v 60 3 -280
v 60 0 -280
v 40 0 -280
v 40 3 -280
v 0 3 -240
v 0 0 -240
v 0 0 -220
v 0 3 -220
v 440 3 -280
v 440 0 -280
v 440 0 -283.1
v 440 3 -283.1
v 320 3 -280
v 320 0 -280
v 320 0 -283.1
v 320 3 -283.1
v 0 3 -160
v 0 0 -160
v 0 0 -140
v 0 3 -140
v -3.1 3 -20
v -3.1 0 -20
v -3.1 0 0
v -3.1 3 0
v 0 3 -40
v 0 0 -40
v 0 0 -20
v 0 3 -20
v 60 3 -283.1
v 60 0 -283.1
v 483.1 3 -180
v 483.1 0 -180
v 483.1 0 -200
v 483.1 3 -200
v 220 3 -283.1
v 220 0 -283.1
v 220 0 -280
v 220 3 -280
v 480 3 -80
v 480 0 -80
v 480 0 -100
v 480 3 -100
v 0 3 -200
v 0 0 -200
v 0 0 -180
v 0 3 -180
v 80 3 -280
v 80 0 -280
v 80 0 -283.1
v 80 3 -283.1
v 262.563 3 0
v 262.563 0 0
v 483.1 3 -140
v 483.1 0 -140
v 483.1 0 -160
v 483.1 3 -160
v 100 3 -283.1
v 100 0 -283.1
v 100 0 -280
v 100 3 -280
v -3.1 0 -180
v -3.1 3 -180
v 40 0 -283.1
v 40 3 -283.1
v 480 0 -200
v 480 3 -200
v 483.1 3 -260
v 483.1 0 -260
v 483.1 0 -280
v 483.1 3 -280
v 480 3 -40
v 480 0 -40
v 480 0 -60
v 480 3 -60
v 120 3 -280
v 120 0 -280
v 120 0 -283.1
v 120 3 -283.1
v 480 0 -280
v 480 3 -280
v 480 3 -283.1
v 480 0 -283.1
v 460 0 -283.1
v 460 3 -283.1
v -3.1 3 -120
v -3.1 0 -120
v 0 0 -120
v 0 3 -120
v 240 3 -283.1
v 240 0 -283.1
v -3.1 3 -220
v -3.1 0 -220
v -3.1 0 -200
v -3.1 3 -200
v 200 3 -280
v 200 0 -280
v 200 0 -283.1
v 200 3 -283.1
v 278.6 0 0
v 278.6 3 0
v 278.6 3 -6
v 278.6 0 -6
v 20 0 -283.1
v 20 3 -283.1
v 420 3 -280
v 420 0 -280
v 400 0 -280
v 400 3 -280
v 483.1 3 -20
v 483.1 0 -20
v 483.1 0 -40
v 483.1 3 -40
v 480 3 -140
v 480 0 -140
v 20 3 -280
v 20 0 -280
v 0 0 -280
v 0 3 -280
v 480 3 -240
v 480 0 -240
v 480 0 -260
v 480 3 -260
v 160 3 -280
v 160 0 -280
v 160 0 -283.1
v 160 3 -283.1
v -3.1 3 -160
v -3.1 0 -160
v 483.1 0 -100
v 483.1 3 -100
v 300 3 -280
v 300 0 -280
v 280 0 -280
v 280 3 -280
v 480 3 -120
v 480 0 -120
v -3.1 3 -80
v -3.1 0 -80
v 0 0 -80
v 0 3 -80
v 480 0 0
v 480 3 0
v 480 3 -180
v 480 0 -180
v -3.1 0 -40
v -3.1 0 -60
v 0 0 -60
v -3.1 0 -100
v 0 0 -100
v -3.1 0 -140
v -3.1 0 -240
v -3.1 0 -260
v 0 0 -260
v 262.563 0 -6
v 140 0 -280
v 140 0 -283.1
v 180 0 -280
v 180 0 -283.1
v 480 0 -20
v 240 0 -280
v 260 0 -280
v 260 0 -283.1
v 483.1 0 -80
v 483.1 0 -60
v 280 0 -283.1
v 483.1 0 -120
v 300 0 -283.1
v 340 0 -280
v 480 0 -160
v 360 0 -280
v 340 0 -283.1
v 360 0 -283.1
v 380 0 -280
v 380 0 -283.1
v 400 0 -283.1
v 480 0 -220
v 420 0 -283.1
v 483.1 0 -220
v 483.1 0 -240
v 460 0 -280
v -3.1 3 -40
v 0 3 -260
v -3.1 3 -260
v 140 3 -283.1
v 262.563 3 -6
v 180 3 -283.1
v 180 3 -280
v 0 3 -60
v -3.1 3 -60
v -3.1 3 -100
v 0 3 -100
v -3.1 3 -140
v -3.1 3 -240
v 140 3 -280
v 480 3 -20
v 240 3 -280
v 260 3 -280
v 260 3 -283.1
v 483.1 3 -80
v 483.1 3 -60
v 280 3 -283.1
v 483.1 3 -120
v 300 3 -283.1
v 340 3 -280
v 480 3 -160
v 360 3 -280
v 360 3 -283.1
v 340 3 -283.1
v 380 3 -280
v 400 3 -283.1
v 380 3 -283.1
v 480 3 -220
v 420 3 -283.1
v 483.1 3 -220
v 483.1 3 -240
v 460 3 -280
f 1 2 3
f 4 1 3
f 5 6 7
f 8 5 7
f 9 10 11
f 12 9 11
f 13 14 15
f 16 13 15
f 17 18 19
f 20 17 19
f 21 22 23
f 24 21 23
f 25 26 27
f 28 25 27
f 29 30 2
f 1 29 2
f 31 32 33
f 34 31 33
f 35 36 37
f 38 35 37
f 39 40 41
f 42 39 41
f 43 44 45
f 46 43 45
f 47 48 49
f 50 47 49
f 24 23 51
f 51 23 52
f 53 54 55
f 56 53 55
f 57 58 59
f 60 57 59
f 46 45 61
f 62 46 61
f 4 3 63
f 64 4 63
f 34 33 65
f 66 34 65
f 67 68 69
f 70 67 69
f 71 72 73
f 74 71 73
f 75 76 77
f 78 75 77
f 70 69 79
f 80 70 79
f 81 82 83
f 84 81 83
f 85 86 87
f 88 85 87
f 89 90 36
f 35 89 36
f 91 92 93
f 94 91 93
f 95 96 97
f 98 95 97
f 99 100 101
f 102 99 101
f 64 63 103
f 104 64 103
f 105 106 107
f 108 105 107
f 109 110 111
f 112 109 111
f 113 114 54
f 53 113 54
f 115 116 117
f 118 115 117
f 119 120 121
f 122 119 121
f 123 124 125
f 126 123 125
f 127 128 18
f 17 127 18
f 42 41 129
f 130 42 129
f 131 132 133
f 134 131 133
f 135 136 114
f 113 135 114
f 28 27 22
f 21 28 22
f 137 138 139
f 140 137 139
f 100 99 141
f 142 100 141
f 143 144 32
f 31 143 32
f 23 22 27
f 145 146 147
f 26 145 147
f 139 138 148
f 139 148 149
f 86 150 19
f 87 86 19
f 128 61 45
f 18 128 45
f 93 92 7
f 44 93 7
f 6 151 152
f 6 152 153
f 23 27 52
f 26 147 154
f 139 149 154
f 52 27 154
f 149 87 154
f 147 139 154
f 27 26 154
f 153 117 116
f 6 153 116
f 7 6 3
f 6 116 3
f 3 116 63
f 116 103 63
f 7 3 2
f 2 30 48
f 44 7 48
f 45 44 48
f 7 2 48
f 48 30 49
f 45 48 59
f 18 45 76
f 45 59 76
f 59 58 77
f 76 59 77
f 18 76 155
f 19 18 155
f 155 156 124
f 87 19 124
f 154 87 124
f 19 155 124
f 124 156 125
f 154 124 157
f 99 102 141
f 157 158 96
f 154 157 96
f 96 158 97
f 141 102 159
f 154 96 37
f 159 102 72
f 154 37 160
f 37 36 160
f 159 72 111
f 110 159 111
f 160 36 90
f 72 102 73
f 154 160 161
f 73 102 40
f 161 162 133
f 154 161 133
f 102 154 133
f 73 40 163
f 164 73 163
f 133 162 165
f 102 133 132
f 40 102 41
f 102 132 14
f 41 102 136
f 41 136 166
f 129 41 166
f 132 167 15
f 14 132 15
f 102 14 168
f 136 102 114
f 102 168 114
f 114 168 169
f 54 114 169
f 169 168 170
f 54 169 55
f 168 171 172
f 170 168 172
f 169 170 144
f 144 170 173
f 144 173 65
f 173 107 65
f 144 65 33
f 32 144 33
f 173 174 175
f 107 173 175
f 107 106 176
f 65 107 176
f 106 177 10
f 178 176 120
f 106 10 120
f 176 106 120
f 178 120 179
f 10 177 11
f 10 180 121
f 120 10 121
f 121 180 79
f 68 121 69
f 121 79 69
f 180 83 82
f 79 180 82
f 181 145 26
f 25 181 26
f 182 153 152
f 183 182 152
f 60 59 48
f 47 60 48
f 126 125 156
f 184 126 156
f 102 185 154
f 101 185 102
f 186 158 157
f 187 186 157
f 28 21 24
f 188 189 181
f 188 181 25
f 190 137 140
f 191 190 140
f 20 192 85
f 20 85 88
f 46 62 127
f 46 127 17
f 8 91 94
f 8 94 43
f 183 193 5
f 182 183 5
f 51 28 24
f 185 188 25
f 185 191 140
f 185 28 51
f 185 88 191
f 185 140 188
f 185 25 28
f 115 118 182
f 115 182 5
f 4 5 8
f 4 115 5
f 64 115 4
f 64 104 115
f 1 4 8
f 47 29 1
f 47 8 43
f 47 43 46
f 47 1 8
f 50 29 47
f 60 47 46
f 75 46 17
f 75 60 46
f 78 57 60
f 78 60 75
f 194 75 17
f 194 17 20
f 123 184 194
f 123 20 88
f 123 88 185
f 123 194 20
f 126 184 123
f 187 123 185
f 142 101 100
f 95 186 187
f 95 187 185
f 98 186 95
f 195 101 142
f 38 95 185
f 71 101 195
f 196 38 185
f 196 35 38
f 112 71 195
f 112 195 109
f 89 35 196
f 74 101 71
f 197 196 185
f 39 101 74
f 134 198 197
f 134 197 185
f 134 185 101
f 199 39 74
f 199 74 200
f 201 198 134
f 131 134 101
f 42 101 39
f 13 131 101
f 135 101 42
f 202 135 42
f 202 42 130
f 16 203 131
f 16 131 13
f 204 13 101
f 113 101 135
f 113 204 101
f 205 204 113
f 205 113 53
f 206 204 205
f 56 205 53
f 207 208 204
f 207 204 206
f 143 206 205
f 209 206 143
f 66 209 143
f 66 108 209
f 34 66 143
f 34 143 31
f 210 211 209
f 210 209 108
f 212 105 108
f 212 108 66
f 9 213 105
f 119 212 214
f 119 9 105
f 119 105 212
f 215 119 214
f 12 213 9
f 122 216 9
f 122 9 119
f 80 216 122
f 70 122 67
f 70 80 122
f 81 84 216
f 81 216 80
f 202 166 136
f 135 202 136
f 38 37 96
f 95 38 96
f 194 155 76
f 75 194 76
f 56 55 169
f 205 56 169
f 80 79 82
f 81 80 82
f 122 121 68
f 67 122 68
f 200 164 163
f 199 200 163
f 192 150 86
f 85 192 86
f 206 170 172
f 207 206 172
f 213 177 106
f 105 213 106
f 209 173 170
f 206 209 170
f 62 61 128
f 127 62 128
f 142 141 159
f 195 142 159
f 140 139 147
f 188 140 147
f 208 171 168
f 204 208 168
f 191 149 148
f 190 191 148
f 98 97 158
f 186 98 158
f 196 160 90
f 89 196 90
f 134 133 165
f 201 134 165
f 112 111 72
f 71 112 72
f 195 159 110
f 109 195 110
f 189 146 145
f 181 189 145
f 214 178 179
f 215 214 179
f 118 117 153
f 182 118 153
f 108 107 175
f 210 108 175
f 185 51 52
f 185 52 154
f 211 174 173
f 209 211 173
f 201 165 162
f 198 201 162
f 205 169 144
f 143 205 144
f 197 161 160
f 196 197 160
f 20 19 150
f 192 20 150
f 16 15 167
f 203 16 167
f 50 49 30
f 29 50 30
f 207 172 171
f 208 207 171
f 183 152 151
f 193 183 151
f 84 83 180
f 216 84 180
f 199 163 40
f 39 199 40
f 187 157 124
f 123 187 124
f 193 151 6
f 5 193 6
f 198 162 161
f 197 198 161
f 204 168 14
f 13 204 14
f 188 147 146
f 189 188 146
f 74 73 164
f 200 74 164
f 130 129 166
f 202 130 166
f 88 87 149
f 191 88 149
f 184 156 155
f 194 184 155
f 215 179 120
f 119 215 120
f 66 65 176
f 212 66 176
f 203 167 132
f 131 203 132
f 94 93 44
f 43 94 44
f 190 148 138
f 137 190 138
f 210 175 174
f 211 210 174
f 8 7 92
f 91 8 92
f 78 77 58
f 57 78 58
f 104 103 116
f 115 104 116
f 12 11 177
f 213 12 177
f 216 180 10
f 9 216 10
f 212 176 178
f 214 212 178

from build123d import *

# Parameters (mm, degrees)
SALIENTE_EXTRUIR1_DEPTH = 3
CROQUIS2_W              = 16.03671643
CROQUIS2_H              = 6
CORTAR_EXTRUIR1_DEPTH   = 10


with BuildPart() as part:
    # Croquis1 → Saliente-Extruir1 (new body)
    with BuildSketch(Plane(origin=(0, 0, 0), x_dir=(1, 0, 0), z_dir=(0, 1, 0))):
        Polygon((480, 280), (480, 283.1), (460, 283.1), (460, 280), (440, 280), (440, 283.1), (420, 283.1), (420, 280), (400, 280), (400, 283.1), (380, 283.1), (380, 280), (360, 280), (360, 283.1), (340, 283.1), (340, 280), (320, 280), (320, 283.1), (300, 283.1), (300, 280), (280, 280), (280, 283.1), (260, 283.1), (260, 280), (240, 280), (240, 283.1), (220, 283.1), (220, 280), (200, 280), (200, 283.1), (180, 283.1), (180, 280), (160, 280), (160, 283.1), (140, 283.1), (140, 280), (120, 280), (120, 283.1), (100, 283.1), (100, 280), (80, 280), (80, 283.1), (60, 283.1), (60, 280), (40, 280), (40, 283.1), (20, 283.1), (20, 280), (0, 280), (0, 260), (-3.1, 260), (-3.1, 240), (0, 240), (0, 220), (-3.1, 220), (-3.1, 200), (0, 200), (0, 180), (-3.1, 180), (-3.1, 160), (0, 160), (0, 140), (-3.1, 140), (-3.1, 120), (0, 120), (0, 100), (-3.1, 100), (-3.1, 80), (0, 80), (0, 60), (-3.1, 60), (-3.1, 40), (0, 40), (0, 20), (-3.1, 20), (-3.1, 0), (0, 0), (480, 0), (480, 20), (483.1, 20), (483.1, 40), (480, 40), (480, 60), (483.1, 60), (483.1, 80), (480, 80), (480, 100), (483.1, 100), (483.1, 120), (480, 120), (480, 140), (483.1, 140), (483.1, 160), (480, 160), (480, 180), (483.1, 180), (483.1, 200), (480, 200), (480, 220), (483.1, 220), (483.1, 240), (480, 240), (480, 260), (483.1, 260), (483.1, 280), align=None)
    extrude(amount=SALIENTE_EXTRUIR1_DEPTH)

    # Croquis2 → Cortar-Extruir1 (cut)
    with BuildSketch(Plane(origin=(0, 3, 0), x_dir=(1, 0, 0), z_dir=(0, 1, 0))):
        with Locations((270.581641785, 3)):
            Rectangle(CROQUIS2_W, CROQUIS2_H)
    extrude(amount=-CORTAR_EXTRUIR1_DEPTH, mode=Mode.SUBTRACT)


solid = part.part
